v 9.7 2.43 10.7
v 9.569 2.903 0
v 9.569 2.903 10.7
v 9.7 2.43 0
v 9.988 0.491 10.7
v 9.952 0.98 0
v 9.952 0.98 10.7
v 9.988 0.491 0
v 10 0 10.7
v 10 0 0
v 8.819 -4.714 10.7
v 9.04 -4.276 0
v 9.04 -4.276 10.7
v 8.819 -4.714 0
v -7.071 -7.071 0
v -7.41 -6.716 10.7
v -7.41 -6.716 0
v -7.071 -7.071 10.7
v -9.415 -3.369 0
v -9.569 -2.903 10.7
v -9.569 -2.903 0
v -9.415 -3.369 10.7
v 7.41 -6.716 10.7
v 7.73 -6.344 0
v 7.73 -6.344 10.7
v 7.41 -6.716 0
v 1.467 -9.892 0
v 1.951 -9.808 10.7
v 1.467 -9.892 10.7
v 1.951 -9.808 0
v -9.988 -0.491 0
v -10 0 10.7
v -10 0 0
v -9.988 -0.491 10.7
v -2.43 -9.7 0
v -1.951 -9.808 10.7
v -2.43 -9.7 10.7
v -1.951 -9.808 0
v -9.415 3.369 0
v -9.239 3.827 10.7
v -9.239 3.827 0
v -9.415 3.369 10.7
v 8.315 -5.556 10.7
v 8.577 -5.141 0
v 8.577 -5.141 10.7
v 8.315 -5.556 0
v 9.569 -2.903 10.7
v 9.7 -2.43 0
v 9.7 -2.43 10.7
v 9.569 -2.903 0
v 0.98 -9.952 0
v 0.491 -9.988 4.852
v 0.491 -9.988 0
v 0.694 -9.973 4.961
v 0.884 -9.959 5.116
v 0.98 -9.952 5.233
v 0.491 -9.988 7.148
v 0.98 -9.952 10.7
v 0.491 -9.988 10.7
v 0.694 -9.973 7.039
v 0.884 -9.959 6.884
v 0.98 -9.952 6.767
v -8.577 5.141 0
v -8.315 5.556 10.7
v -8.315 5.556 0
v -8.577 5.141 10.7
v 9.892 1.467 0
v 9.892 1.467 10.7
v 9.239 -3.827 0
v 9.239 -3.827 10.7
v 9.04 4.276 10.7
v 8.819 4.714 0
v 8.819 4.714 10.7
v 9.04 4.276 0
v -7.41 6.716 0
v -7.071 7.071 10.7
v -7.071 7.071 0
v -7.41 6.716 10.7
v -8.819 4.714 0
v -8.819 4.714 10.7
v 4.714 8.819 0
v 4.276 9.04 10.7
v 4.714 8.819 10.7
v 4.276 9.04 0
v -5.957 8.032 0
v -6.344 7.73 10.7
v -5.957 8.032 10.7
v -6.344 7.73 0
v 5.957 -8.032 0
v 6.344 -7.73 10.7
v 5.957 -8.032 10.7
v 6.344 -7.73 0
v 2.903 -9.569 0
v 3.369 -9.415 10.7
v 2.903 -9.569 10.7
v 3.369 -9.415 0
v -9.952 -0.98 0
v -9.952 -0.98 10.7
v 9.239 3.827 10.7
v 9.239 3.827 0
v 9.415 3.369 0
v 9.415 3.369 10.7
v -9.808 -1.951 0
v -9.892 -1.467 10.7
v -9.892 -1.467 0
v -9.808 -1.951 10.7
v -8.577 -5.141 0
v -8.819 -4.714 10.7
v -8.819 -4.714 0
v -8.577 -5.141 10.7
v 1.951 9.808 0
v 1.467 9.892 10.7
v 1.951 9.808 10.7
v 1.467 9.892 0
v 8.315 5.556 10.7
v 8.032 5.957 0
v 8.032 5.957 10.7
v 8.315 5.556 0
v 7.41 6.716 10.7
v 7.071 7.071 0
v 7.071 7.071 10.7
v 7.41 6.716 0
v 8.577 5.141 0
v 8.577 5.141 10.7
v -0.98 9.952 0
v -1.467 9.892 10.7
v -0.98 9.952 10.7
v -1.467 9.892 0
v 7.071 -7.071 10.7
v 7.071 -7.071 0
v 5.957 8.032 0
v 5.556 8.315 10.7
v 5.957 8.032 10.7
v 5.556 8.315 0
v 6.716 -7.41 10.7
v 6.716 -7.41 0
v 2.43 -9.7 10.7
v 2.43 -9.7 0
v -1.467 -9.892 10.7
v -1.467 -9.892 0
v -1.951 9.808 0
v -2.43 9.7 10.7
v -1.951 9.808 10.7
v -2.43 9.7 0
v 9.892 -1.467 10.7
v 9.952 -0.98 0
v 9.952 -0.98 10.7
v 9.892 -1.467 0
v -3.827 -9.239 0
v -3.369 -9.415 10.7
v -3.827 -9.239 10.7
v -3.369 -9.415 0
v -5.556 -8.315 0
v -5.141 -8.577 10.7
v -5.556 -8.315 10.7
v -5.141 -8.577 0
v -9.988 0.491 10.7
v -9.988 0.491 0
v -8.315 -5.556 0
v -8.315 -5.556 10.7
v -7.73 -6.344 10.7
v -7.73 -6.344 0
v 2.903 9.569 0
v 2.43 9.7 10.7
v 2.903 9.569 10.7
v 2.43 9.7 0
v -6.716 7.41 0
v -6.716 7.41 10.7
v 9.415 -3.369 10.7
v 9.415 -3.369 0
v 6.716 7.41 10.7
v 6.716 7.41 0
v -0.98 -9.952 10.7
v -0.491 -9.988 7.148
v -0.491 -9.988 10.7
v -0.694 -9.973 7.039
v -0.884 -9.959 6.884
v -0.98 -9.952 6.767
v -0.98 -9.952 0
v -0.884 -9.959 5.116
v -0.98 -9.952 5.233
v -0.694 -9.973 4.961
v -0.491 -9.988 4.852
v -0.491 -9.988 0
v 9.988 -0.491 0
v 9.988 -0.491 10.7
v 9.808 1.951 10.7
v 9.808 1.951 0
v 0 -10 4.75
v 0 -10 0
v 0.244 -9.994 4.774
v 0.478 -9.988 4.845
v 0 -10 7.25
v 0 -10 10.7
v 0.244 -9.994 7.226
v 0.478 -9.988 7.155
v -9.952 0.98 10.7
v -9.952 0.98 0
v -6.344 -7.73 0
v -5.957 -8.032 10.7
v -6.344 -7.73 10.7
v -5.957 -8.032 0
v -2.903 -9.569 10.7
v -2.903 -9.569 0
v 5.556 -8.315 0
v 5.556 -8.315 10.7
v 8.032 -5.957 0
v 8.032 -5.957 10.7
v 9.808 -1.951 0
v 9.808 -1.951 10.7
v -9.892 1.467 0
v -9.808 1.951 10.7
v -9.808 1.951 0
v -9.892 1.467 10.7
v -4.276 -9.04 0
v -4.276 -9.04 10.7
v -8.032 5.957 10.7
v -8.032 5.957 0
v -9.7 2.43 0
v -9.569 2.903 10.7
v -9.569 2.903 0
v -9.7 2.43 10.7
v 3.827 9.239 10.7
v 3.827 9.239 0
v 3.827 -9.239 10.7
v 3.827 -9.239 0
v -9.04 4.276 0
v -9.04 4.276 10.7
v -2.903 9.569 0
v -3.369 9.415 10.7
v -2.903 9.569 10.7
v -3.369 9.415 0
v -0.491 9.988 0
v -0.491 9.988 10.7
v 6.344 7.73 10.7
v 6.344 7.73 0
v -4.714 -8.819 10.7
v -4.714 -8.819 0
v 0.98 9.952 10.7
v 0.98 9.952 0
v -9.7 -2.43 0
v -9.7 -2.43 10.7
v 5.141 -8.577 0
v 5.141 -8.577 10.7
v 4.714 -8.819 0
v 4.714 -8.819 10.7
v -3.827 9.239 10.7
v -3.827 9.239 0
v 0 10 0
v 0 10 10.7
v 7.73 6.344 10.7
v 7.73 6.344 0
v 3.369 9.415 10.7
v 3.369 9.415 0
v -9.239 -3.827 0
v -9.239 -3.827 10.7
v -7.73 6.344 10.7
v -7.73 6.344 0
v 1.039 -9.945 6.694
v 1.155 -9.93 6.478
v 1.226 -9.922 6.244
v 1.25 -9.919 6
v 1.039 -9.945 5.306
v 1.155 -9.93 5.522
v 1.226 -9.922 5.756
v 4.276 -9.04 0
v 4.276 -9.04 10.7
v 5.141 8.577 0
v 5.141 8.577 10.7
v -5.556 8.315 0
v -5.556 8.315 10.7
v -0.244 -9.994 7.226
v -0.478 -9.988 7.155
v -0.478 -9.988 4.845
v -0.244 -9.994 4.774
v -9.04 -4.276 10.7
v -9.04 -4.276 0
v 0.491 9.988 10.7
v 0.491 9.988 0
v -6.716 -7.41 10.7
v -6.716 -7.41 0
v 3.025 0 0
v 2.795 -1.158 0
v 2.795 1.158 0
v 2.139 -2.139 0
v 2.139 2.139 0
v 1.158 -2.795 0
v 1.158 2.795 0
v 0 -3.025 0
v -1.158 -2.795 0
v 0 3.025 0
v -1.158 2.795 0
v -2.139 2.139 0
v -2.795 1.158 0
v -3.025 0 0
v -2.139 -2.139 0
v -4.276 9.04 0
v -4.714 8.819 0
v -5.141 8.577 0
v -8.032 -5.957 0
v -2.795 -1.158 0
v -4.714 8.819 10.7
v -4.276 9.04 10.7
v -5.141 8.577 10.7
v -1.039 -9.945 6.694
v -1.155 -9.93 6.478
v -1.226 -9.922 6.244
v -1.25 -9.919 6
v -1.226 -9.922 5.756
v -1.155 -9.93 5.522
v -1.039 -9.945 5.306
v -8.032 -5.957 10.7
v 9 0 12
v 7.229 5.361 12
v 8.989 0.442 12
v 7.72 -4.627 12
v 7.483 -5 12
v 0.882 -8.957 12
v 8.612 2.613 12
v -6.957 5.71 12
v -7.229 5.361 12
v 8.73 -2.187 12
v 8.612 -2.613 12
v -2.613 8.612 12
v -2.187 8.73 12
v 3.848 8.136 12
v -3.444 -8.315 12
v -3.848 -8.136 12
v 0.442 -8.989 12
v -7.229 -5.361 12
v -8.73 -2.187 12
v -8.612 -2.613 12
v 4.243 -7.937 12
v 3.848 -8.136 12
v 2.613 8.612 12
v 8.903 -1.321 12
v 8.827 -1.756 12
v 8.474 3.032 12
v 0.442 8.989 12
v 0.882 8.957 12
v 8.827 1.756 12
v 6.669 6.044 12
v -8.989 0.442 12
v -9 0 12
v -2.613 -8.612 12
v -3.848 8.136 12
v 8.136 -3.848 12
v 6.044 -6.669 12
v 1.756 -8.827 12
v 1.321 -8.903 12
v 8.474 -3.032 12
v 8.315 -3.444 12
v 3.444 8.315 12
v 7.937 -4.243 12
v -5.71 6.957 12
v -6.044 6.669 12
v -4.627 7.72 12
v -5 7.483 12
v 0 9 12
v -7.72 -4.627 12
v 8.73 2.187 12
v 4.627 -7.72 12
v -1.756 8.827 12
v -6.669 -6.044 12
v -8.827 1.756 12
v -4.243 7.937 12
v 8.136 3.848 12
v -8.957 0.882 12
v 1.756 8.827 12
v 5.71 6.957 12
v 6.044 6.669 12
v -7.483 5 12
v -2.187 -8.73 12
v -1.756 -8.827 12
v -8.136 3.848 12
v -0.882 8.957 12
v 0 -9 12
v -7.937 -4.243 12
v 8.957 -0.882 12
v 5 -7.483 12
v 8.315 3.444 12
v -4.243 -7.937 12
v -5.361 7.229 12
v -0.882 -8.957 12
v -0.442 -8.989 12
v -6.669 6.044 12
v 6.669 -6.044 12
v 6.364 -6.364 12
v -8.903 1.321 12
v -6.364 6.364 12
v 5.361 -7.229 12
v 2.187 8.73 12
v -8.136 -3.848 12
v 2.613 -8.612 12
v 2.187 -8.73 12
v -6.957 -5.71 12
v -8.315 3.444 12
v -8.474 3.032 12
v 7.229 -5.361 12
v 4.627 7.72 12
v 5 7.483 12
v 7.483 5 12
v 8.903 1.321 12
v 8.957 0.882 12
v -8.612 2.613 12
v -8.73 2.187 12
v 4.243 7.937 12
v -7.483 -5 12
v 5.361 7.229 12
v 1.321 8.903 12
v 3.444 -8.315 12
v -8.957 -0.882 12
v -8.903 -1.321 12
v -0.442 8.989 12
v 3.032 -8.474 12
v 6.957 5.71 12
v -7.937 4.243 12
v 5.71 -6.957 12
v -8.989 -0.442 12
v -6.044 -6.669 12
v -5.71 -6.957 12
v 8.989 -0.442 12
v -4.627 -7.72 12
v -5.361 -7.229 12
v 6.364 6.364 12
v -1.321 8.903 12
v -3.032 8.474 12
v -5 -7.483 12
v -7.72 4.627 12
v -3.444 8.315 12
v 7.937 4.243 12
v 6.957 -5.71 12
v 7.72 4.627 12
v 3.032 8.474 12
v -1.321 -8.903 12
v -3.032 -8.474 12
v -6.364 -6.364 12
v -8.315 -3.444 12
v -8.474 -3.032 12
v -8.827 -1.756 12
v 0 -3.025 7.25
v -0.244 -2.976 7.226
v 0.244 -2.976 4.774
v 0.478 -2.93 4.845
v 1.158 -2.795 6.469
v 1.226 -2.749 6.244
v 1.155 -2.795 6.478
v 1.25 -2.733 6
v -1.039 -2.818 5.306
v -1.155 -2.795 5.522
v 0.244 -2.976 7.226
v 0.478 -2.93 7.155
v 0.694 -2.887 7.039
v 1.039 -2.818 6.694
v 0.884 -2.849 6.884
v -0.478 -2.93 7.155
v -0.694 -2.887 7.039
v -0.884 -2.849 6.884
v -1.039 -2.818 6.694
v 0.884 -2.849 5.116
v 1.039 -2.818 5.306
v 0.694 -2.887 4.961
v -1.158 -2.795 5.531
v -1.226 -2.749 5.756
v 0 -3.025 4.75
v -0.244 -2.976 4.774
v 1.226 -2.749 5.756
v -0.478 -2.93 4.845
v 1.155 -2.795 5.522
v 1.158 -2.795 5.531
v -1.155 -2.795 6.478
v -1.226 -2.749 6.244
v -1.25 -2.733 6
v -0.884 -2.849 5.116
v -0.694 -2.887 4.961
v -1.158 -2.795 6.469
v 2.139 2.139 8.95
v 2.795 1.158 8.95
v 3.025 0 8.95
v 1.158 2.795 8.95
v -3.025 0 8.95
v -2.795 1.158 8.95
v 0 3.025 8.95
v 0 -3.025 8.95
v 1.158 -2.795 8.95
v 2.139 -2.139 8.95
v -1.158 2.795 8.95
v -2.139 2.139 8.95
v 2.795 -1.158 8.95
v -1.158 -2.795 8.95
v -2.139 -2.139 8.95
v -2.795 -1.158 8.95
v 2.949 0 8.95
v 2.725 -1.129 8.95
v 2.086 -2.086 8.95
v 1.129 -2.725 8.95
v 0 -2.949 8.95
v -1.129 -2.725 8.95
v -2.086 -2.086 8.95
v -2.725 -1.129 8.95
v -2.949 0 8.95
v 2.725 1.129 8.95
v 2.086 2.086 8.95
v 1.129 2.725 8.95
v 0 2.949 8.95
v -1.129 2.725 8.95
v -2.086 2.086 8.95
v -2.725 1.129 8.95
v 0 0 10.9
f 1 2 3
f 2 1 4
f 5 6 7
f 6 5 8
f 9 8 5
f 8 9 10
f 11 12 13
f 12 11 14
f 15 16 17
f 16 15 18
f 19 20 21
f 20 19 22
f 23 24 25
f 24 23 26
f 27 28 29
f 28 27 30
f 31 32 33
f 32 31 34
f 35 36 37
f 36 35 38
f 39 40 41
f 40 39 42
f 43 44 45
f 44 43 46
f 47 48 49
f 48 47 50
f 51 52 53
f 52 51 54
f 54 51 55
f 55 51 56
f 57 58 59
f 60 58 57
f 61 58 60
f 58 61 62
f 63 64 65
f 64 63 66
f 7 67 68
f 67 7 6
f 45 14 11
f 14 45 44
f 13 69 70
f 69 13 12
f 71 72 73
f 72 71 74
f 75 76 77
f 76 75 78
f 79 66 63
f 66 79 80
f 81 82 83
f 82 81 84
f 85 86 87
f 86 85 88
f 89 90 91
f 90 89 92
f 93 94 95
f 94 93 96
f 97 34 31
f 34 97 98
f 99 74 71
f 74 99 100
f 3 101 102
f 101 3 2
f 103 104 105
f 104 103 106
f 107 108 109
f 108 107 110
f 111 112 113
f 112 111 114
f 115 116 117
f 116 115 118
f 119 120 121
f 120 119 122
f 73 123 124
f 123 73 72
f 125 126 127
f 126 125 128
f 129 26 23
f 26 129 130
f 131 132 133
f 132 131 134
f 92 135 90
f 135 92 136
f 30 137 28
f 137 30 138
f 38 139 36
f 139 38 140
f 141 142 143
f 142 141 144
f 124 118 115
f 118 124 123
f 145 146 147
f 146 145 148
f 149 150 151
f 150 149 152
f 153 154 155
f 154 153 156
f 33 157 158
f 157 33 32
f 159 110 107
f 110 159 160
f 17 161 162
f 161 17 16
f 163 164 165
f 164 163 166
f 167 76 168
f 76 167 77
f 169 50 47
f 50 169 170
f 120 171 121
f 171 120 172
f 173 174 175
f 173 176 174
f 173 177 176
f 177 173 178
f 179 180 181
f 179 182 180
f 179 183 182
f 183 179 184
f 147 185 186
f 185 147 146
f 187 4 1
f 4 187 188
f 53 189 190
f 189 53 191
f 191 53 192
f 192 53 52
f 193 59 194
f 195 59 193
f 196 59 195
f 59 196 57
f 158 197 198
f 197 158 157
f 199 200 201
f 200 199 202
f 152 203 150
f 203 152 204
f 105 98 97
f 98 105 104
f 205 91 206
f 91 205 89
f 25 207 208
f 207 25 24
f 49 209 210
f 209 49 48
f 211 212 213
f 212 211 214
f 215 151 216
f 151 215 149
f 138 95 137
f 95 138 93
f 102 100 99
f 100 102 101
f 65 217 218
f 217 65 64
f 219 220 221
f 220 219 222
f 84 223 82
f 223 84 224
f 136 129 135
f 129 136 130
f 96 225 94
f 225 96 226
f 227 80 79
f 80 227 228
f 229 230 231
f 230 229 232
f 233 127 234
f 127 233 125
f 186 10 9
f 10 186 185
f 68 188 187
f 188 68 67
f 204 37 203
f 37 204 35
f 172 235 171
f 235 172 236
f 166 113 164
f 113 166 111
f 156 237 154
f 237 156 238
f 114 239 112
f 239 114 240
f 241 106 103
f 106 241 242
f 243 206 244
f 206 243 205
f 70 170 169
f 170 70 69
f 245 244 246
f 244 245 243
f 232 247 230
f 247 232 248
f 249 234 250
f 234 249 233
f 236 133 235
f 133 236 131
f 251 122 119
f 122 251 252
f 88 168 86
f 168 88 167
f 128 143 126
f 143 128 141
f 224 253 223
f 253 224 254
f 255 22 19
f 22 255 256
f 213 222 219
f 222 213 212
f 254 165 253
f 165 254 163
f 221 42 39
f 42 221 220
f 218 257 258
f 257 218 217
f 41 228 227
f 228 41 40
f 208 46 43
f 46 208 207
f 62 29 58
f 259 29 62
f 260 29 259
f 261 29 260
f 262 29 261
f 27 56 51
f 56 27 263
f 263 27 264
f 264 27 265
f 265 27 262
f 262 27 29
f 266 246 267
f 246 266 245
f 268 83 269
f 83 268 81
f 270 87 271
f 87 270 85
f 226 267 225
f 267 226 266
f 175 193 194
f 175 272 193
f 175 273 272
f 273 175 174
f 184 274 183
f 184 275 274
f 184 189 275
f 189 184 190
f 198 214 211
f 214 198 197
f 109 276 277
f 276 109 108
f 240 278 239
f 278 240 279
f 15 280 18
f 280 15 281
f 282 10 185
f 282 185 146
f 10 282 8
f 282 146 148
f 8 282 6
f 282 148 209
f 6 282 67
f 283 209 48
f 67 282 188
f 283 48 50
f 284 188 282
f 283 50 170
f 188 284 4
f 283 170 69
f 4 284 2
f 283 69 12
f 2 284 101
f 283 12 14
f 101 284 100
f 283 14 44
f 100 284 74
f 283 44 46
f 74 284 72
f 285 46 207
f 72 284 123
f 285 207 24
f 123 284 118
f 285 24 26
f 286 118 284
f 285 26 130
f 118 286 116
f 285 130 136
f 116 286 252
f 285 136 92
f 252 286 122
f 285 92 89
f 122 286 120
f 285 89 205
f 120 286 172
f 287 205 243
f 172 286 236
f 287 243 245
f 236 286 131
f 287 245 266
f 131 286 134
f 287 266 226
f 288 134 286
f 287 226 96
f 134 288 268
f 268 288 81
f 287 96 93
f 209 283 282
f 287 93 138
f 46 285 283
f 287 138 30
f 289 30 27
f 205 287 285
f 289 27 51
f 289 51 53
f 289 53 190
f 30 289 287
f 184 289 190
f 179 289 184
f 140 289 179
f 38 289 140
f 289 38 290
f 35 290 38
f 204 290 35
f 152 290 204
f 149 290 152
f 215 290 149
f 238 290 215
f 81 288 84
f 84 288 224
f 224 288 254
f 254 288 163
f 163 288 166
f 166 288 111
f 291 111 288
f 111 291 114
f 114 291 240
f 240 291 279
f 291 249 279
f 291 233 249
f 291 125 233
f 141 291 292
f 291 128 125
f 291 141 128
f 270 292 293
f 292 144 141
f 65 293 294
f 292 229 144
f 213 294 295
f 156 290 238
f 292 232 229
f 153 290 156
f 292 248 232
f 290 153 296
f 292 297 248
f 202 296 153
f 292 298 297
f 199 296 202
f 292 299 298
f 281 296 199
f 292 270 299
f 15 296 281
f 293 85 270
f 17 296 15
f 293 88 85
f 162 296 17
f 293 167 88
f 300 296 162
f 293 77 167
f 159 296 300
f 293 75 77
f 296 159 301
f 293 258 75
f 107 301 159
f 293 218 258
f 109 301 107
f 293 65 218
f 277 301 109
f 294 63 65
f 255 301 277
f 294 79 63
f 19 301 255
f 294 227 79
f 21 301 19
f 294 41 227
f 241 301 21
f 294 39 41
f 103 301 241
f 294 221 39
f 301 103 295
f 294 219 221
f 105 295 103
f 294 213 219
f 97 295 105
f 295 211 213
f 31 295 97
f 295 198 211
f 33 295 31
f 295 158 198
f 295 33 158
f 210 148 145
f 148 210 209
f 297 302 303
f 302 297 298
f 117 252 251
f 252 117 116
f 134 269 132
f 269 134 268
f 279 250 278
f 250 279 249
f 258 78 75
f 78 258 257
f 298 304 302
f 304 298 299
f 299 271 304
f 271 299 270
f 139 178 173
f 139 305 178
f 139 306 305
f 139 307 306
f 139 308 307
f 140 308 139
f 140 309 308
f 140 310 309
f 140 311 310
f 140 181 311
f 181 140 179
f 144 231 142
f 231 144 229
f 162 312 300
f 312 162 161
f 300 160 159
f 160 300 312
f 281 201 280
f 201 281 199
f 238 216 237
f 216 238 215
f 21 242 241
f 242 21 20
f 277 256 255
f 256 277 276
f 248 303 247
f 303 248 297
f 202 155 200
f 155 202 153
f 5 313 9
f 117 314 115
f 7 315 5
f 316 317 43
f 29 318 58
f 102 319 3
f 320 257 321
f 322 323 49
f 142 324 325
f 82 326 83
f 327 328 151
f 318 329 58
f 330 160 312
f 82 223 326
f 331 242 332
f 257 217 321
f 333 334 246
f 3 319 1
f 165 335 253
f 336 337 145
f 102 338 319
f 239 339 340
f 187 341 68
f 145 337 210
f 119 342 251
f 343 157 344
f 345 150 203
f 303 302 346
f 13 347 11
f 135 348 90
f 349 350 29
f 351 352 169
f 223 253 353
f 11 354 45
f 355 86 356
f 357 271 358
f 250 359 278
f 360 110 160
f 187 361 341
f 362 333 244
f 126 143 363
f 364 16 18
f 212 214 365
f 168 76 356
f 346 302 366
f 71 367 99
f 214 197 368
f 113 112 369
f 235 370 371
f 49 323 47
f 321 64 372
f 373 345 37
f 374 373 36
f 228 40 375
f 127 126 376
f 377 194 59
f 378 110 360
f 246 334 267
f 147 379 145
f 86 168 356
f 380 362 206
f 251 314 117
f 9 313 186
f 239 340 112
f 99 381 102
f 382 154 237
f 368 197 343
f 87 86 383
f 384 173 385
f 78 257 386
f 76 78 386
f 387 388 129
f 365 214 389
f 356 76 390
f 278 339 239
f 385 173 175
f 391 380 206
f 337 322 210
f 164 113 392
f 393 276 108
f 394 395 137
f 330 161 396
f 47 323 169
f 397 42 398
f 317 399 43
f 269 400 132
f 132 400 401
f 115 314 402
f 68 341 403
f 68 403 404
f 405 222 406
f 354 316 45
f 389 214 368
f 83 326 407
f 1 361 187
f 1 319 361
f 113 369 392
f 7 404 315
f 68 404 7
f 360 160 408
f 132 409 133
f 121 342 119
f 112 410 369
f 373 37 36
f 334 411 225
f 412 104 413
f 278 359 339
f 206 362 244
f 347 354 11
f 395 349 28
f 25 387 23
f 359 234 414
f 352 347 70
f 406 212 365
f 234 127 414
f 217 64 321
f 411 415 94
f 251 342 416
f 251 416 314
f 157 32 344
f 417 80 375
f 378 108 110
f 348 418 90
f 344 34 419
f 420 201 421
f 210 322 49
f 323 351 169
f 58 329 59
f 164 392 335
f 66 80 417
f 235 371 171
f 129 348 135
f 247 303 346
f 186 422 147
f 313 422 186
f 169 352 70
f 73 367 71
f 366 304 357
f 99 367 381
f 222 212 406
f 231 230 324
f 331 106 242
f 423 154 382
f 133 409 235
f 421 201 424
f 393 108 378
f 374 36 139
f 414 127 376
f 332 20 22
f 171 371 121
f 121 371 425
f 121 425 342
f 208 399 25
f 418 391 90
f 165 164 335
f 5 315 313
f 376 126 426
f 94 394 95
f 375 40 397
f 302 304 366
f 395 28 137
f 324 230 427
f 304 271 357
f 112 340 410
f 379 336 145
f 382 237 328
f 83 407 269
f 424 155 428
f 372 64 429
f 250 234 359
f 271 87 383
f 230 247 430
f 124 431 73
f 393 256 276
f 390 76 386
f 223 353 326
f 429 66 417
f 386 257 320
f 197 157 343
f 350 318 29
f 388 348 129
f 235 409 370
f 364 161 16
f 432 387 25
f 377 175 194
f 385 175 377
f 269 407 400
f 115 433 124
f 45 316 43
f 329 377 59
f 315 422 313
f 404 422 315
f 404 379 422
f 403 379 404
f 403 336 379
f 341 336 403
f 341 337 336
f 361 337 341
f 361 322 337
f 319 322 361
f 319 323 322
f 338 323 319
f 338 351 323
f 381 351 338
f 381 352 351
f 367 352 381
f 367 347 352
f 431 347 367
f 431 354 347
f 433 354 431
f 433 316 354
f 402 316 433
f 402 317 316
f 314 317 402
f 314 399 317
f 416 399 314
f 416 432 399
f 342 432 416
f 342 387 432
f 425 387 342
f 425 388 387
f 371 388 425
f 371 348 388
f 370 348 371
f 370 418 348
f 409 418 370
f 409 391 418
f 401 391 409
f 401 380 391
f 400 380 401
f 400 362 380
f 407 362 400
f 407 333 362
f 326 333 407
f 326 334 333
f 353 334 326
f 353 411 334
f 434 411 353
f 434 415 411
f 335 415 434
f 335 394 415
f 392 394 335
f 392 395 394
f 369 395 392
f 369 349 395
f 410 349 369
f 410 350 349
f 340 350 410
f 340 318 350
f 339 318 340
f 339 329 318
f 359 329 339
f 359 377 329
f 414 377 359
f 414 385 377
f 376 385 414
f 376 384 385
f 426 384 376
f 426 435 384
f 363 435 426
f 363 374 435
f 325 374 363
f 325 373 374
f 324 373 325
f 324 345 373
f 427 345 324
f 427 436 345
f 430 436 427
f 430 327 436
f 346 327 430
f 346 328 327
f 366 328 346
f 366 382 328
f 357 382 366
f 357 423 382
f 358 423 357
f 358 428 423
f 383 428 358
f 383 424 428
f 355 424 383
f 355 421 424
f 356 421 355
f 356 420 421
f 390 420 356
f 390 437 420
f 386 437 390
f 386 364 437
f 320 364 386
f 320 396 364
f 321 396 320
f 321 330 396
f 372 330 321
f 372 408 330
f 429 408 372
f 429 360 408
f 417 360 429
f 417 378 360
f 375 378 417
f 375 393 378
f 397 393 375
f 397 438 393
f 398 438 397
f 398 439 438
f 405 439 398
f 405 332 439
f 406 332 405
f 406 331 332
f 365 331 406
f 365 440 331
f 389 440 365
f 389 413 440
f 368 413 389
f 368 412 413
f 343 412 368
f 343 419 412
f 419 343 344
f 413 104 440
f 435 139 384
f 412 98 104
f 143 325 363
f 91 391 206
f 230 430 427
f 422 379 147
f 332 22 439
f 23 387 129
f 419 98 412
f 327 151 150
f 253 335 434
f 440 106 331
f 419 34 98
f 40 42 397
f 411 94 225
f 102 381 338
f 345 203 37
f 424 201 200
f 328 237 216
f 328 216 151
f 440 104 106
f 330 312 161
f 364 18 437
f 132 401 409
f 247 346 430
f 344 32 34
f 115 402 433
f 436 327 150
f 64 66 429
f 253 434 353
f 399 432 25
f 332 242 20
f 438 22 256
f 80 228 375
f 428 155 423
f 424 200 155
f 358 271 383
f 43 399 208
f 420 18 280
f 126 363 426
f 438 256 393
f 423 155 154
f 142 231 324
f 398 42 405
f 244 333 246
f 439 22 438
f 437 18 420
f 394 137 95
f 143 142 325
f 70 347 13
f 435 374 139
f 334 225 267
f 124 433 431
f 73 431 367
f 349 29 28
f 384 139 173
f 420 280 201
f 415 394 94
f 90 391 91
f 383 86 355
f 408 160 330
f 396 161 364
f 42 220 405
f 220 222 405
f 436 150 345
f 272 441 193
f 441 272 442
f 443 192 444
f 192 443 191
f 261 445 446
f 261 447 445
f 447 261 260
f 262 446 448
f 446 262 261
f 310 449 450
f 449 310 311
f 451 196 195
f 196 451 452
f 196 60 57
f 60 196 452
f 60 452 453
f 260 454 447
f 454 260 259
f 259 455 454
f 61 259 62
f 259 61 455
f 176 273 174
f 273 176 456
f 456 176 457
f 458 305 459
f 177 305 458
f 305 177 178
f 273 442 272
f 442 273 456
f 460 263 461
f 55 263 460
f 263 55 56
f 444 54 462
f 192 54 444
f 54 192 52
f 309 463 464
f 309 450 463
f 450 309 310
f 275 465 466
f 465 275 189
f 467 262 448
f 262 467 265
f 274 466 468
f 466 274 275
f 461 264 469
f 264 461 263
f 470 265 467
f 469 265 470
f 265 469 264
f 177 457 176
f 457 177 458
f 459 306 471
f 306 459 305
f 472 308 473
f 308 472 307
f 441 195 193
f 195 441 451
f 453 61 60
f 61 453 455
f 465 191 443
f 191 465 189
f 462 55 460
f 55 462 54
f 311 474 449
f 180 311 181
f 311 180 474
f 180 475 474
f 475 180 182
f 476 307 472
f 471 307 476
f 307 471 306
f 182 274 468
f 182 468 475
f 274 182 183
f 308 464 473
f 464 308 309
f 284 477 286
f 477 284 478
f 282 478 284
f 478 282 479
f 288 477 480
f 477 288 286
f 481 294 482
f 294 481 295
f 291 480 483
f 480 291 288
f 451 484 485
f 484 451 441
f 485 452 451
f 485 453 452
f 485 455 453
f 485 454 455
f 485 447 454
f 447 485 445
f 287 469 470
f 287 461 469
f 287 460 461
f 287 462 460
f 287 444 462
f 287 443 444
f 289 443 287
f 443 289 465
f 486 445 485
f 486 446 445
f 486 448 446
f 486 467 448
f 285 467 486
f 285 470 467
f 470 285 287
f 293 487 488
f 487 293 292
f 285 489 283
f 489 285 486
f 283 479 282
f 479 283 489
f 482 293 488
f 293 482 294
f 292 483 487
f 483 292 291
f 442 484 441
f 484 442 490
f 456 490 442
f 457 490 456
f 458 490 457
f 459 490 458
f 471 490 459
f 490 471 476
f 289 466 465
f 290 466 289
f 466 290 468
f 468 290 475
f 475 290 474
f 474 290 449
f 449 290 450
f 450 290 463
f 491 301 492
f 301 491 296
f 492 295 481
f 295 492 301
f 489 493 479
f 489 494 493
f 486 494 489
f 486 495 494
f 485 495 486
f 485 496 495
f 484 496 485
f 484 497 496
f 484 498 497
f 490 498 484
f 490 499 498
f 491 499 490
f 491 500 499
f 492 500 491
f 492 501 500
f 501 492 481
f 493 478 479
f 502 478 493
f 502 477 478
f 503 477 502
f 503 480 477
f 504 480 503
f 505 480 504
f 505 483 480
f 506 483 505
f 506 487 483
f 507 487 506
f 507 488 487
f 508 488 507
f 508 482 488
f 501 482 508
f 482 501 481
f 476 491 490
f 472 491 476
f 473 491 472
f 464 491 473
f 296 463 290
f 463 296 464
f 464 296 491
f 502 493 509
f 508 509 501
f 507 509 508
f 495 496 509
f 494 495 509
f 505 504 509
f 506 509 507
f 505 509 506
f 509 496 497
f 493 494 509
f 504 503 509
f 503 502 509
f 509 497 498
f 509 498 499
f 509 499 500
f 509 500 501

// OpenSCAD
//OpenSCAD-Skript

//Moduldefinition mit Parametern für Frontplattensystem im 19mm-Raster
module PotiKnopf (
//Parameter
diami=6.05,   //Wellendurchmesser Poti
diama=20,    //Außendurchmesser Knopf
diams=2.5,   //Klemmschraubendurchmesser 
hght=12,     //Höhe Knopf
hghti=10,  //Höhe Indikator
wdthi=1      //Breite Indikator
)
//Beginn Modul
{
difference(){   //difference 1
union(){        //union 1
difference(){   //difference 2
union(){        //union 2
    //alles, was vor der nächsten geschweiften Klammer steht, wird zusammengefügt (union 2)
//Körper des Frontplattensegments
cylinder(d=diama,h=hght-1.3,$fn=128);
translate([0,0,hght-1.3]) cylinder(d1=diama,d2=diama-2,h=1.3,$fn=128);
 
//Indikator
translate([-wdthi/2,0,0]) cube([wdthi,diama/2-0.1,hghti]);

}               //union 2 end
    //alles, was vor der nächsten geschweiften Klammer steht, wird davon abgezogen (difference 2)
//Anschrägung Indikator
translate([-wdthi,diama/2,hght-1]) rotate([40,0,0]) cube([2*wdthi,5,5]);
//Bohrung Klemmschraube M3
rotate([90,0,0]) translate([0,hght/2,0]) cylinder(d=diams,h=15,$fn=32);
//Bohrung Achse
translate([0,0,-0.05]) cylinder(d=diami,h=hght-3,$fn=16);
translate([0,0,hght-3-0.1]) cylinder(d1=diami,d2=0,h=2,$fn=16);
}  //difference 2 end
    //alles, was vor der nächsten geschweiften Klammer steht, wird dazu hinzugefügt (union 1)

}               //union 1 end
    //alles, was vor der nächsten geschweiften Klammer steht, wird davon wieder abgezogen (difference 1)

}               //difference 1 end

}  //module end

//Hier werden Instanzen des Moduls aufgerufen
translate([0,0,0]) PotiKnopf();
